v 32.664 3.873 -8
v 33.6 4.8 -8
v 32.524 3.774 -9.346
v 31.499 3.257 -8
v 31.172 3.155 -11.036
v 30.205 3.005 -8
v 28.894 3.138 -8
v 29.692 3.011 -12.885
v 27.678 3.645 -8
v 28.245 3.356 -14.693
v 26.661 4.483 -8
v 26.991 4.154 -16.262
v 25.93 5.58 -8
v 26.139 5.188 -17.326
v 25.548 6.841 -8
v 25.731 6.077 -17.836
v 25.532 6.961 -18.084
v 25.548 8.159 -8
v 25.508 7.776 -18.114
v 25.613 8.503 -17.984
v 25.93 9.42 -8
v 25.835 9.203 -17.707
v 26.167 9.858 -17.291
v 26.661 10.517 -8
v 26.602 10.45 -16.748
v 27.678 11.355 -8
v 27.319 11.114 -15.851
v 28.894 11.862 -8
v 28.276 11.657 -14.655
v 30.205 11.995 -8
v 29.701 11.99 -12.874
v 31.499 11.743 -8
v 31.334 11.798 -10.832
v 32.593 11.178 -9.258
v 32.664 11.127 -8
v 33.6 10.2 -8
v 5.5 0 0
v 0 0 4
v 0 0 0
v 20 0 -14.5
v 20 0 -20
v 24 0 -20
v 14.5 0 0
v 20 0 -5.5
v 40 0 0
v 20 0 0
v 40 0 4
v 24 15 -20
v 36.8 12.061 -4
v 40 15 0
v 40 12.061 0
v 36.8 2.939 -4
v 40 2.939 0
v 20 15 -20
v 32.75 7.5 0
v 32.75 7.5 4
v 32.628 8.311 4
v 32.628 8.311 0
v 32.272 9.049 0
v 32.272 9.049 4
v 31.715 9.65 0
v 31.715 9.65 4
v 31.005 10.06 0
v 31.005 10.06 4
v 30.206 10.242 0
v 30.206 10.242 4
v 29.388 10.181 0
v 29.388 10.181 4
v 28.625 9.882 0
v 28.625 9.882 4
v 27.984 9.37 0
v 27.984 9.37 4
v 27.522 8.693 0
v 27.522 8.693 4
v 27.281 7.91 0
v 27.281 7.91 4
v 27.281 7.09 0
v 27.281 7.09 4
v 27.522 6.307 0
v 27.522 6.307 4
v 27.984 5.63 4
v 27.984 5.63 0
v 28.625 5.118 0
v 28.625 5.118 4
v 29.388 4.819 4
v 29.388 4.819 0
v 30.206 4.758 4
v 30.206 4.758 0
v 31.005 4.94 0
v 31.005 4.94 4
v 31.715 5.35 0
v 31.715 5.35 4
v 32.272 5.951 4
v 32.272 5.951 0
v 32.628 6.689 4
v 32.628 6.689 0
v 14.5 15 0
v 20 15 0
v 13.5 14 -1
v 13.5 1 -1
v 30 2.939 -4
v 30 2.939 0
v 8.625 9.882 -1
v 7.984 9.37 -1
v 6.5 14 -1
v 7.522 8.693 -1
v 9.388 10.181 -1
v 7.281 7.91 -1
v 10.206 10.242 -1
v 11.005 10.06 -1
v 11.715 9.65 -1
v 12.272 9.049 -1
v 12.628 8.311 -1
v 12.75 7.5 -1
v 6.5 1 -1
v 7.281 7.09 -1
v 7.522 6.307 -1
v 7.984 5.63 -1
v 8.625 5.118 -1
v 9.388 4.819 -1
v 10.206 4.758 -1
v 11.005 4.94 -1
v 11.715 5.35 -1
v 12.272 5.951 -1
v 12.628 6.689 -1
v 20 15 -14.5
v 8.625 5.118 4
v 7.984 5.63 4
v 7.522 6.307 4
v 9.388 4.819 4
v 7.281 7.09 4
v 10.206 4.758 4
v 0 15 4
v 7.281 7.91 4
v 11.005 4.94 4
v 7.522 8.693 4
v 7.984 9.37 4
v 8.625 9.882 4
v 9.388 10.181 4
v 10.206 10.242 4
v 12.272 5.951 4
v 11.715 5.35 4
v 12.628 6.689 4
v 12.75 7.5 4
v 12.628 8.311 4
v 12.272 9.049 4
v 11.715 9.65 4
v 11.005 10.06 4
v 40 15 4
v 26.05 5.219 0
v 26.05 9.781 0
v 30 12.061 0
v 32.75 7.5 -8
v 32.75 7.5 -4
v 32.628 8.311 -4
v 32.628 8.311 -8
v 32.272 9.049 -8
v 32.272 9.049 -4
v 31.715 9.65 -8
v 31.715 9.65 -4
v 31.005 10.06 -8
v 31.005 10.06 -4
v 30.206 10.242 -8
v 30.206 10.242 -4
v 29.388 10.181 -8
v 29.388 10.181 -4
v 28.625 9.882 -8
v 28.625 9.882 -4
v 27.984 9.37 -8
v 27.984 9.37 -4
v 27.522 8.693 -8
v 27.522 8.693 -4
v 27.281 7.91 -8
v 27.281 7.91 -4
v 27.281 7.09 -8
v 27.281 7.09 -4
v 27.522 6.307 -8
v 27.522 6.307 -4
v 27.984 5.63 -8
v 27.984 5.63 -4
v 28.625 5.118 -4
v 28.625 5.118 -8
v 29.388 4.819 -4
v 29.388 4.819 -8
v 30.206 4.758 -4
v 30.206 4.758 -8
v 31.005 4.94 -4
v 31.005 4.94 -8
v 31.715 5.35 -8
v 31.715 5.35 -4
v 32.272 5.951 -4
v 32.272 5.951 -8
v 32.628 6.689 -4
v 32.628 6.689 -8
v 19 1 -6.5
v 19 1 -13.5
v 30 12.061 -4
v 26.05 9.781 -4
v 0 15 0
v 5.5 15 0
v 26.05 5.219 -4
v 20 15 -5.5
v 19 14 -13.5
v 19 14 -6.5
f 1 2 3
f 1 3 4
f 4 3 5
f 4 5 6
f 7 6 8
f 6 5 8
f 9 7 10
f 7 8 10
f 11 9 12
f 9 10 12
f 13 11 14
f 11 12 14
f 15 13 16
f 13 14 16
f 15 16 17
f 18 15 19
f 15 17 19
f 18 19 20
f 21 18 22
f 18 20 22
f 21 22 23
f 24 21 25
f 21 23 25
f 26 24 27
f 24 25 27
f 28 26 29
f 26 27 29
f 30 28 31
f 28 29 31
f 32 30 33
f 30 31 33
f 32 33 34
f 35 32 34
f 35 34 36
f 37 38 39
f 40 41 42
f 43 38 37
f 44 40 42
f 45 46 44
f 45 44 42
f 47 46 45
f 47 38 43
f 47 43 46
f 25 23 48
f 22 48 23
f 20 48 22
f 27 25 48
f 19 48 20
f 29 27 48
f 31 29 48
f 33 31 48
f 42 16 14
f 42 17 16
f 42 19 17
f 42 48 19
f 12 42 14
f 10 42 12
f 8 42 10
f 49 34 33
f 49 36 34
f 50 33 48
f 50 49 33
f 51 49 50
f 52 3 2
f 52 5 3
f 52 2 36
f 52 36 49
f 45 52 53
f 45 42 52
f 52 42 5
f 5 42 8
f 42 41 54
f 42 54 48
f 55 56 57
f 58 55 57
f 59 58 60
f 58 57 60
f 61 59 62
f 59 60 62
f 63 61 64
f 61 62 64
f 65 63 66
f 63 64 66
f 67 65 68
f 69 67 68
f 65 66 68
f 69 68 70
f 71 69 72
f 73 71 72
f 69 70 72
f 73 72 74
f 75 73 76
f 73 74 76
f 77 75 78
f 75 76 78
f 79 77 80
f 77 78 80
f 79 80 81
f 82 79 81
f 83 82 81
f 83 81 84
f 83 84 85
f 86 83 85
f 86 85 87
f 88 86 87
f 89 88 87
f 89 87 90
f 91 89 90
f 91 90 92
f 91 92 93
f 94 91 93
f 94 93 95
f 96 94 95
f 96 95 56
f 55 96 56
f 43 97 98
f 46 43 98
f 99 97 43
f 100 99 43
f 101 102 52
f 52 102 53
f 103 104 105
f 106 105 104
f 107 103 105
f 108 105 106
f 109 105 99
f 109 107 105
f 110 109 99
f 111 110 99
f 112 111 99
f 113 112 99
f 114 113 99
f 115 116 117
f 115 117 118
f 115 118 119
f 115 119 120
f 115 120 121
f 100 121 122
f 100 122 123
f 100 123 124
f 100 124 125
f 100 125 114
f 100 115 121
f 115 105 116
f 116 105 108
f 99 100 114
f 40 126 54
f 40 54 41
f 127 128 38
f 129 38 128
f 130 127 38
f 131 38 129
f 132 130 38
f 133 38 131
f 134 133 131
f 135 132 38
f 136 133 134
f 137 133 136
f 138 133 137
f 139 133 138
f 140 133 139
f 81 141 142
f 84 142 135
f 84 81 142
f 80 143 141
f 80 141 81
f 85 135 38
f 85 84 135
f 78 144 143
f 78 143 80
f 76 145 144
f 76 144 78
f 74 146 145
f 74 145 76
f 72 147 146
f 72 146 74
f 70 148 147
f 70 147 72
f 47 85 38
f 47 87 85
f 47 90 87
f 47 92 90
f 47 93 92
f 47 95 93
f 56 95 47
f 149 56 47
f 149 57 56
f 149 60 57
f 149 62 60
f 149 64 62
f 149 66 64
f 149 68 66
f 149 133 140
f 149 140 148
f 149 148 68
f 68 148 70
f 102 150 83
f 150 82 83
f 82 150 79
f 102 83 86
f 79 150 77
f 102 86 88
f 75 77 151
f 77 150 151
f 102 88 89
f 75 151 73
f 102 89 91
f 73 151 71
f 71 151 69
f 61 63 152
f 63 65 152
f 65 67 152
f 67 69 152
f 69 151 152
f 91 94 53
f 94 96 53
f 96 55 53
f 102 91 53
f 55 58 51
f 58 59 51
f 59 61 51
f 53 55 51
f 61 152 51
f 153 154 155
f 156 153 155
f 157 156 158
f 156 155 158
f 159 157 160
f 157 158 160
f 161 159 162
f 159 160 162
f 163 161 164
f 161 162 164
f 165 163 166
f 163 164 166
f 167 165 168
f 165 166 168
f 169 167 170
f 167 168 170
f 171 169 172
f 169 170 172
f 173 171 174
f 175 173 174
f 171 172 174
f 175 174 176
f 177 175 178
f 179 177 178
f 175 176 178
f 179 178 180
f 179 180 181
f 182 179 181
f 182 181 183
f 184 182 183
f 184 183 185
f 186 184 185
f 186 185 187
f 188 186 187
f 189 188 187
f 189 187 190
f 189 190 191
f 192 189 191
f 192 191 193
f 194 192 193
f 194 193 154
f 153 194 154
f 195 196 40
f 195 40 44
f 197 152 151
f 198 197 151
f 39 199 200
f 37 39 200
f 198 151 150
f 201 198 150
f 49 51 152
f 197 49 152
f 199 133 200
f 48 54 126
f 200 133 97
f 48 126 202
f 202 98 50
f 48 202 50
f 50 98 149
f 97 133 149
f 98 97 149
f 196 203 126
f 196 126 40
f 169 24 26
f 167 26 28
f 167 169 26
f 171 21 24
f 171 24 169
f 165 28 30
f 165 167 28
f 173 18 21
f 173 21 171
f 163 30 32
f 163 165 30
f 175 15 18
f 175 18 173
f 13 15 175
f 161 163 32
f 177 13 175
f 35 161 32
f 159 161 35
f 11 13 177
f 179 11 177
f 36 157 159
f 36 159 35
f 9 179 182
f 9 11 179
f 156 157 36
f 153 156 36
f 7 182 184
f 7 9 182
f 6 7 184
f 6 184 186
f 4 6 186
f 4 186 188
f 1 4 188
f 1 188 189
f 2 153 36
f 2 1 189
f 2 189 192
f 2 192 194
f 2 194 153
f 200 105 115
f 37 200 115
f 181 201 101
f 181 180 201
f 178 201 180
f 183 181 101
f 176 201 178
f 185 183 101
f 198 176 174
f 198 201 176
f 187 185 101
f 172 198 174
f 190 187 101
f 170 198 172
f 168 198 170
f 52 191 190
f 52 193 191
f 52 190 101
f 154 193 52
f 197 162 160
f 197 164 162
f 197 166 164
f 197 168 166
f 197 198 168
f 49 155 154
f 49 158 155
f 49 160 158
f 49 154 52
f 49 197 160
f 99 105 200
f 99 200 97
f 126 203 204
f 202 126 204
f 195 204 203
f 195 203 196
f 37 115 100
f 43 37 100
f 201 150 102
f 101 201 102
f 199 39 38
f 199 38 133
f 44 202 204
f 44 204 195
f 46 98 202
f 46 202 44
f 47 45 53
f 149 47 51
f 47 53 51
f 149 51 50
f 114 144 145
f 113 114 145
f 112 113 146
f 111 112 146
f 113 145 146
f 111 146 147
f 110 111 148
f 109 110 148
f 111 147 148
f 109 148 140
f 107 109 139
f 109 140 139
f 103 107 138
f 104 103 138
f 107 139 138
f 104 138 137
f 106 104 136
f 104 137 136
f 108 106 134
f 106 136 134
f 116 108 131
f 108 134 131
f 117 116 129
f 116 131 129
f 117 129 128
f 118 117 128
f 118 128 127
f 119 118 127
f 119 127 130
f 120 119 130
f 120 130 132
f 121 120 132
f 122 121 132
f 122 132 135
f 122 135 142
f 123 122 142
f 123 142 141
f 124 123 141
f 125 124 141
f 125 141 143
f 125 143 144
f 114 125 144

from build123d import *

# Parameters (mm, degrees)
F0_W      = 40
F0_H      = 15
F1_DEPTH  = 4
F2_W      = 9
F2_H      = 15
F2_W_2    = 4
F3_DEPTH  = 1
F4_DEPTH  = 19
F5_W      = 15
F5_H      = 9
F6_DEPTH  = 1
F7_SIZE   = 0.99999
F9_DEPTH  = 15
F12_DEPTH = 4
F13_R     = 2.75
F14_DEPTH = 24.001
F15_R     = 4.5
F16_DEPTH = 12


# Not quite as in the source:
# - a fillet or chamfer is up to 0.001 mm smaller than in the source, because OpenCascade refuses the exact size


with BuildPart() as f1:
    # F0 (on Top) → F1 (new body)
    with BuildSketch(Plane.XY):
        with Locations((20, 7.5)):
            Rectangle(F0_W, F0_H)
    extrude(amount=F1_DEPTH)

    # F2 (on face) → F3 (join)
    with BuildSketch(Plane(origin=(0, 0, 0), x_dir=(1, 0, 0), z_dir=(0, 0, -1))):
        with Locations((10, -7.5)):
            Rectangle(F2_W, F2_H)
        with Locations((22, -7.5)):
            Rectangle(F2_W_2, F2_H)
    extrude(amount=F3_DEPTH)

    # F4 (add): a face of the model
    f4_faces = [f1.faces().sort_by_distance(p)[0] for p in [
        (22, 7.5, -1),
    ]]
    extrude(f4_faces, amount=F4_DEPTH)

    # F5 (on face) → F6 (join)
    with BuildSketch(Plane(origin=(20, 0, 0), x_dir=(0, -1, 0), z_dir=(-1, 0, 0))):
        with Locations((-7.5, -10)):
            Rectangle(F5_W, F5_H)
    extrude(amount=F6_DEPTH)

    # F7 (size 1 in the source; OpenCascade refuses exactly that, so slightly less here)
    f7_edges = [f1.edges().sort_by_distance(p)[0] for p in [
        (19, 15, -10),
        (19, 7.5, -14.5),
        (19, 0, -10),
        (19, 7.5, -5.5),
        (10, 0, -1),
        (5.5, 7.5, -1),
        (10, 15, -1),
        (14.5, 7.5, -1),
    ]]
    chamfer(f7_edges, length=F7_SIZE)

    # F8 (on face) → F9 (join, through all)
    with BuildSketch(Plane.XZ):
        Polygon((40, 0), (24, 0), (24, -20), align=None)
    extrude(amount=-F9_DEPTH)

    # F11 (on offset) → F12 (cut)
    with BuildSketch(Plane.XY):
        Polygon((26.05, 5.2194664367), (30, 2.9389328734), (40, 2.9389328734), (40, 12.0610671266), (30, 12.0610671266), (26.05, 9.7805335633), align=None)
    extrude(amount=-F12_DEPTH, mode=Mode.SUBTRACT)

    # F13 (on face) → F14 (cut, through all)
    with BuildSketch(Plane.XY.offset(4)):
        with Locations((30, 7.5)):
            Circle(F13_R)
        with Locations((10, 7.5)):
            Circle(F13_R)
    extrude(amount=-F14_DEPTH, mode=Mode.SUBTRACT)

    # F15 (on face) → F16 (cut)
    with BuildSketch(Plane(origin=(0, 0, -20), x_dir=(1, 0, 0), z_dir=(0, 0, -1))):
        with Locations((30, -7.5)):
            Circle(F15_R)
    extrude(amount=-F16_DEPTH, mode=Mode.SUBTRACT)


solid = f1.part
